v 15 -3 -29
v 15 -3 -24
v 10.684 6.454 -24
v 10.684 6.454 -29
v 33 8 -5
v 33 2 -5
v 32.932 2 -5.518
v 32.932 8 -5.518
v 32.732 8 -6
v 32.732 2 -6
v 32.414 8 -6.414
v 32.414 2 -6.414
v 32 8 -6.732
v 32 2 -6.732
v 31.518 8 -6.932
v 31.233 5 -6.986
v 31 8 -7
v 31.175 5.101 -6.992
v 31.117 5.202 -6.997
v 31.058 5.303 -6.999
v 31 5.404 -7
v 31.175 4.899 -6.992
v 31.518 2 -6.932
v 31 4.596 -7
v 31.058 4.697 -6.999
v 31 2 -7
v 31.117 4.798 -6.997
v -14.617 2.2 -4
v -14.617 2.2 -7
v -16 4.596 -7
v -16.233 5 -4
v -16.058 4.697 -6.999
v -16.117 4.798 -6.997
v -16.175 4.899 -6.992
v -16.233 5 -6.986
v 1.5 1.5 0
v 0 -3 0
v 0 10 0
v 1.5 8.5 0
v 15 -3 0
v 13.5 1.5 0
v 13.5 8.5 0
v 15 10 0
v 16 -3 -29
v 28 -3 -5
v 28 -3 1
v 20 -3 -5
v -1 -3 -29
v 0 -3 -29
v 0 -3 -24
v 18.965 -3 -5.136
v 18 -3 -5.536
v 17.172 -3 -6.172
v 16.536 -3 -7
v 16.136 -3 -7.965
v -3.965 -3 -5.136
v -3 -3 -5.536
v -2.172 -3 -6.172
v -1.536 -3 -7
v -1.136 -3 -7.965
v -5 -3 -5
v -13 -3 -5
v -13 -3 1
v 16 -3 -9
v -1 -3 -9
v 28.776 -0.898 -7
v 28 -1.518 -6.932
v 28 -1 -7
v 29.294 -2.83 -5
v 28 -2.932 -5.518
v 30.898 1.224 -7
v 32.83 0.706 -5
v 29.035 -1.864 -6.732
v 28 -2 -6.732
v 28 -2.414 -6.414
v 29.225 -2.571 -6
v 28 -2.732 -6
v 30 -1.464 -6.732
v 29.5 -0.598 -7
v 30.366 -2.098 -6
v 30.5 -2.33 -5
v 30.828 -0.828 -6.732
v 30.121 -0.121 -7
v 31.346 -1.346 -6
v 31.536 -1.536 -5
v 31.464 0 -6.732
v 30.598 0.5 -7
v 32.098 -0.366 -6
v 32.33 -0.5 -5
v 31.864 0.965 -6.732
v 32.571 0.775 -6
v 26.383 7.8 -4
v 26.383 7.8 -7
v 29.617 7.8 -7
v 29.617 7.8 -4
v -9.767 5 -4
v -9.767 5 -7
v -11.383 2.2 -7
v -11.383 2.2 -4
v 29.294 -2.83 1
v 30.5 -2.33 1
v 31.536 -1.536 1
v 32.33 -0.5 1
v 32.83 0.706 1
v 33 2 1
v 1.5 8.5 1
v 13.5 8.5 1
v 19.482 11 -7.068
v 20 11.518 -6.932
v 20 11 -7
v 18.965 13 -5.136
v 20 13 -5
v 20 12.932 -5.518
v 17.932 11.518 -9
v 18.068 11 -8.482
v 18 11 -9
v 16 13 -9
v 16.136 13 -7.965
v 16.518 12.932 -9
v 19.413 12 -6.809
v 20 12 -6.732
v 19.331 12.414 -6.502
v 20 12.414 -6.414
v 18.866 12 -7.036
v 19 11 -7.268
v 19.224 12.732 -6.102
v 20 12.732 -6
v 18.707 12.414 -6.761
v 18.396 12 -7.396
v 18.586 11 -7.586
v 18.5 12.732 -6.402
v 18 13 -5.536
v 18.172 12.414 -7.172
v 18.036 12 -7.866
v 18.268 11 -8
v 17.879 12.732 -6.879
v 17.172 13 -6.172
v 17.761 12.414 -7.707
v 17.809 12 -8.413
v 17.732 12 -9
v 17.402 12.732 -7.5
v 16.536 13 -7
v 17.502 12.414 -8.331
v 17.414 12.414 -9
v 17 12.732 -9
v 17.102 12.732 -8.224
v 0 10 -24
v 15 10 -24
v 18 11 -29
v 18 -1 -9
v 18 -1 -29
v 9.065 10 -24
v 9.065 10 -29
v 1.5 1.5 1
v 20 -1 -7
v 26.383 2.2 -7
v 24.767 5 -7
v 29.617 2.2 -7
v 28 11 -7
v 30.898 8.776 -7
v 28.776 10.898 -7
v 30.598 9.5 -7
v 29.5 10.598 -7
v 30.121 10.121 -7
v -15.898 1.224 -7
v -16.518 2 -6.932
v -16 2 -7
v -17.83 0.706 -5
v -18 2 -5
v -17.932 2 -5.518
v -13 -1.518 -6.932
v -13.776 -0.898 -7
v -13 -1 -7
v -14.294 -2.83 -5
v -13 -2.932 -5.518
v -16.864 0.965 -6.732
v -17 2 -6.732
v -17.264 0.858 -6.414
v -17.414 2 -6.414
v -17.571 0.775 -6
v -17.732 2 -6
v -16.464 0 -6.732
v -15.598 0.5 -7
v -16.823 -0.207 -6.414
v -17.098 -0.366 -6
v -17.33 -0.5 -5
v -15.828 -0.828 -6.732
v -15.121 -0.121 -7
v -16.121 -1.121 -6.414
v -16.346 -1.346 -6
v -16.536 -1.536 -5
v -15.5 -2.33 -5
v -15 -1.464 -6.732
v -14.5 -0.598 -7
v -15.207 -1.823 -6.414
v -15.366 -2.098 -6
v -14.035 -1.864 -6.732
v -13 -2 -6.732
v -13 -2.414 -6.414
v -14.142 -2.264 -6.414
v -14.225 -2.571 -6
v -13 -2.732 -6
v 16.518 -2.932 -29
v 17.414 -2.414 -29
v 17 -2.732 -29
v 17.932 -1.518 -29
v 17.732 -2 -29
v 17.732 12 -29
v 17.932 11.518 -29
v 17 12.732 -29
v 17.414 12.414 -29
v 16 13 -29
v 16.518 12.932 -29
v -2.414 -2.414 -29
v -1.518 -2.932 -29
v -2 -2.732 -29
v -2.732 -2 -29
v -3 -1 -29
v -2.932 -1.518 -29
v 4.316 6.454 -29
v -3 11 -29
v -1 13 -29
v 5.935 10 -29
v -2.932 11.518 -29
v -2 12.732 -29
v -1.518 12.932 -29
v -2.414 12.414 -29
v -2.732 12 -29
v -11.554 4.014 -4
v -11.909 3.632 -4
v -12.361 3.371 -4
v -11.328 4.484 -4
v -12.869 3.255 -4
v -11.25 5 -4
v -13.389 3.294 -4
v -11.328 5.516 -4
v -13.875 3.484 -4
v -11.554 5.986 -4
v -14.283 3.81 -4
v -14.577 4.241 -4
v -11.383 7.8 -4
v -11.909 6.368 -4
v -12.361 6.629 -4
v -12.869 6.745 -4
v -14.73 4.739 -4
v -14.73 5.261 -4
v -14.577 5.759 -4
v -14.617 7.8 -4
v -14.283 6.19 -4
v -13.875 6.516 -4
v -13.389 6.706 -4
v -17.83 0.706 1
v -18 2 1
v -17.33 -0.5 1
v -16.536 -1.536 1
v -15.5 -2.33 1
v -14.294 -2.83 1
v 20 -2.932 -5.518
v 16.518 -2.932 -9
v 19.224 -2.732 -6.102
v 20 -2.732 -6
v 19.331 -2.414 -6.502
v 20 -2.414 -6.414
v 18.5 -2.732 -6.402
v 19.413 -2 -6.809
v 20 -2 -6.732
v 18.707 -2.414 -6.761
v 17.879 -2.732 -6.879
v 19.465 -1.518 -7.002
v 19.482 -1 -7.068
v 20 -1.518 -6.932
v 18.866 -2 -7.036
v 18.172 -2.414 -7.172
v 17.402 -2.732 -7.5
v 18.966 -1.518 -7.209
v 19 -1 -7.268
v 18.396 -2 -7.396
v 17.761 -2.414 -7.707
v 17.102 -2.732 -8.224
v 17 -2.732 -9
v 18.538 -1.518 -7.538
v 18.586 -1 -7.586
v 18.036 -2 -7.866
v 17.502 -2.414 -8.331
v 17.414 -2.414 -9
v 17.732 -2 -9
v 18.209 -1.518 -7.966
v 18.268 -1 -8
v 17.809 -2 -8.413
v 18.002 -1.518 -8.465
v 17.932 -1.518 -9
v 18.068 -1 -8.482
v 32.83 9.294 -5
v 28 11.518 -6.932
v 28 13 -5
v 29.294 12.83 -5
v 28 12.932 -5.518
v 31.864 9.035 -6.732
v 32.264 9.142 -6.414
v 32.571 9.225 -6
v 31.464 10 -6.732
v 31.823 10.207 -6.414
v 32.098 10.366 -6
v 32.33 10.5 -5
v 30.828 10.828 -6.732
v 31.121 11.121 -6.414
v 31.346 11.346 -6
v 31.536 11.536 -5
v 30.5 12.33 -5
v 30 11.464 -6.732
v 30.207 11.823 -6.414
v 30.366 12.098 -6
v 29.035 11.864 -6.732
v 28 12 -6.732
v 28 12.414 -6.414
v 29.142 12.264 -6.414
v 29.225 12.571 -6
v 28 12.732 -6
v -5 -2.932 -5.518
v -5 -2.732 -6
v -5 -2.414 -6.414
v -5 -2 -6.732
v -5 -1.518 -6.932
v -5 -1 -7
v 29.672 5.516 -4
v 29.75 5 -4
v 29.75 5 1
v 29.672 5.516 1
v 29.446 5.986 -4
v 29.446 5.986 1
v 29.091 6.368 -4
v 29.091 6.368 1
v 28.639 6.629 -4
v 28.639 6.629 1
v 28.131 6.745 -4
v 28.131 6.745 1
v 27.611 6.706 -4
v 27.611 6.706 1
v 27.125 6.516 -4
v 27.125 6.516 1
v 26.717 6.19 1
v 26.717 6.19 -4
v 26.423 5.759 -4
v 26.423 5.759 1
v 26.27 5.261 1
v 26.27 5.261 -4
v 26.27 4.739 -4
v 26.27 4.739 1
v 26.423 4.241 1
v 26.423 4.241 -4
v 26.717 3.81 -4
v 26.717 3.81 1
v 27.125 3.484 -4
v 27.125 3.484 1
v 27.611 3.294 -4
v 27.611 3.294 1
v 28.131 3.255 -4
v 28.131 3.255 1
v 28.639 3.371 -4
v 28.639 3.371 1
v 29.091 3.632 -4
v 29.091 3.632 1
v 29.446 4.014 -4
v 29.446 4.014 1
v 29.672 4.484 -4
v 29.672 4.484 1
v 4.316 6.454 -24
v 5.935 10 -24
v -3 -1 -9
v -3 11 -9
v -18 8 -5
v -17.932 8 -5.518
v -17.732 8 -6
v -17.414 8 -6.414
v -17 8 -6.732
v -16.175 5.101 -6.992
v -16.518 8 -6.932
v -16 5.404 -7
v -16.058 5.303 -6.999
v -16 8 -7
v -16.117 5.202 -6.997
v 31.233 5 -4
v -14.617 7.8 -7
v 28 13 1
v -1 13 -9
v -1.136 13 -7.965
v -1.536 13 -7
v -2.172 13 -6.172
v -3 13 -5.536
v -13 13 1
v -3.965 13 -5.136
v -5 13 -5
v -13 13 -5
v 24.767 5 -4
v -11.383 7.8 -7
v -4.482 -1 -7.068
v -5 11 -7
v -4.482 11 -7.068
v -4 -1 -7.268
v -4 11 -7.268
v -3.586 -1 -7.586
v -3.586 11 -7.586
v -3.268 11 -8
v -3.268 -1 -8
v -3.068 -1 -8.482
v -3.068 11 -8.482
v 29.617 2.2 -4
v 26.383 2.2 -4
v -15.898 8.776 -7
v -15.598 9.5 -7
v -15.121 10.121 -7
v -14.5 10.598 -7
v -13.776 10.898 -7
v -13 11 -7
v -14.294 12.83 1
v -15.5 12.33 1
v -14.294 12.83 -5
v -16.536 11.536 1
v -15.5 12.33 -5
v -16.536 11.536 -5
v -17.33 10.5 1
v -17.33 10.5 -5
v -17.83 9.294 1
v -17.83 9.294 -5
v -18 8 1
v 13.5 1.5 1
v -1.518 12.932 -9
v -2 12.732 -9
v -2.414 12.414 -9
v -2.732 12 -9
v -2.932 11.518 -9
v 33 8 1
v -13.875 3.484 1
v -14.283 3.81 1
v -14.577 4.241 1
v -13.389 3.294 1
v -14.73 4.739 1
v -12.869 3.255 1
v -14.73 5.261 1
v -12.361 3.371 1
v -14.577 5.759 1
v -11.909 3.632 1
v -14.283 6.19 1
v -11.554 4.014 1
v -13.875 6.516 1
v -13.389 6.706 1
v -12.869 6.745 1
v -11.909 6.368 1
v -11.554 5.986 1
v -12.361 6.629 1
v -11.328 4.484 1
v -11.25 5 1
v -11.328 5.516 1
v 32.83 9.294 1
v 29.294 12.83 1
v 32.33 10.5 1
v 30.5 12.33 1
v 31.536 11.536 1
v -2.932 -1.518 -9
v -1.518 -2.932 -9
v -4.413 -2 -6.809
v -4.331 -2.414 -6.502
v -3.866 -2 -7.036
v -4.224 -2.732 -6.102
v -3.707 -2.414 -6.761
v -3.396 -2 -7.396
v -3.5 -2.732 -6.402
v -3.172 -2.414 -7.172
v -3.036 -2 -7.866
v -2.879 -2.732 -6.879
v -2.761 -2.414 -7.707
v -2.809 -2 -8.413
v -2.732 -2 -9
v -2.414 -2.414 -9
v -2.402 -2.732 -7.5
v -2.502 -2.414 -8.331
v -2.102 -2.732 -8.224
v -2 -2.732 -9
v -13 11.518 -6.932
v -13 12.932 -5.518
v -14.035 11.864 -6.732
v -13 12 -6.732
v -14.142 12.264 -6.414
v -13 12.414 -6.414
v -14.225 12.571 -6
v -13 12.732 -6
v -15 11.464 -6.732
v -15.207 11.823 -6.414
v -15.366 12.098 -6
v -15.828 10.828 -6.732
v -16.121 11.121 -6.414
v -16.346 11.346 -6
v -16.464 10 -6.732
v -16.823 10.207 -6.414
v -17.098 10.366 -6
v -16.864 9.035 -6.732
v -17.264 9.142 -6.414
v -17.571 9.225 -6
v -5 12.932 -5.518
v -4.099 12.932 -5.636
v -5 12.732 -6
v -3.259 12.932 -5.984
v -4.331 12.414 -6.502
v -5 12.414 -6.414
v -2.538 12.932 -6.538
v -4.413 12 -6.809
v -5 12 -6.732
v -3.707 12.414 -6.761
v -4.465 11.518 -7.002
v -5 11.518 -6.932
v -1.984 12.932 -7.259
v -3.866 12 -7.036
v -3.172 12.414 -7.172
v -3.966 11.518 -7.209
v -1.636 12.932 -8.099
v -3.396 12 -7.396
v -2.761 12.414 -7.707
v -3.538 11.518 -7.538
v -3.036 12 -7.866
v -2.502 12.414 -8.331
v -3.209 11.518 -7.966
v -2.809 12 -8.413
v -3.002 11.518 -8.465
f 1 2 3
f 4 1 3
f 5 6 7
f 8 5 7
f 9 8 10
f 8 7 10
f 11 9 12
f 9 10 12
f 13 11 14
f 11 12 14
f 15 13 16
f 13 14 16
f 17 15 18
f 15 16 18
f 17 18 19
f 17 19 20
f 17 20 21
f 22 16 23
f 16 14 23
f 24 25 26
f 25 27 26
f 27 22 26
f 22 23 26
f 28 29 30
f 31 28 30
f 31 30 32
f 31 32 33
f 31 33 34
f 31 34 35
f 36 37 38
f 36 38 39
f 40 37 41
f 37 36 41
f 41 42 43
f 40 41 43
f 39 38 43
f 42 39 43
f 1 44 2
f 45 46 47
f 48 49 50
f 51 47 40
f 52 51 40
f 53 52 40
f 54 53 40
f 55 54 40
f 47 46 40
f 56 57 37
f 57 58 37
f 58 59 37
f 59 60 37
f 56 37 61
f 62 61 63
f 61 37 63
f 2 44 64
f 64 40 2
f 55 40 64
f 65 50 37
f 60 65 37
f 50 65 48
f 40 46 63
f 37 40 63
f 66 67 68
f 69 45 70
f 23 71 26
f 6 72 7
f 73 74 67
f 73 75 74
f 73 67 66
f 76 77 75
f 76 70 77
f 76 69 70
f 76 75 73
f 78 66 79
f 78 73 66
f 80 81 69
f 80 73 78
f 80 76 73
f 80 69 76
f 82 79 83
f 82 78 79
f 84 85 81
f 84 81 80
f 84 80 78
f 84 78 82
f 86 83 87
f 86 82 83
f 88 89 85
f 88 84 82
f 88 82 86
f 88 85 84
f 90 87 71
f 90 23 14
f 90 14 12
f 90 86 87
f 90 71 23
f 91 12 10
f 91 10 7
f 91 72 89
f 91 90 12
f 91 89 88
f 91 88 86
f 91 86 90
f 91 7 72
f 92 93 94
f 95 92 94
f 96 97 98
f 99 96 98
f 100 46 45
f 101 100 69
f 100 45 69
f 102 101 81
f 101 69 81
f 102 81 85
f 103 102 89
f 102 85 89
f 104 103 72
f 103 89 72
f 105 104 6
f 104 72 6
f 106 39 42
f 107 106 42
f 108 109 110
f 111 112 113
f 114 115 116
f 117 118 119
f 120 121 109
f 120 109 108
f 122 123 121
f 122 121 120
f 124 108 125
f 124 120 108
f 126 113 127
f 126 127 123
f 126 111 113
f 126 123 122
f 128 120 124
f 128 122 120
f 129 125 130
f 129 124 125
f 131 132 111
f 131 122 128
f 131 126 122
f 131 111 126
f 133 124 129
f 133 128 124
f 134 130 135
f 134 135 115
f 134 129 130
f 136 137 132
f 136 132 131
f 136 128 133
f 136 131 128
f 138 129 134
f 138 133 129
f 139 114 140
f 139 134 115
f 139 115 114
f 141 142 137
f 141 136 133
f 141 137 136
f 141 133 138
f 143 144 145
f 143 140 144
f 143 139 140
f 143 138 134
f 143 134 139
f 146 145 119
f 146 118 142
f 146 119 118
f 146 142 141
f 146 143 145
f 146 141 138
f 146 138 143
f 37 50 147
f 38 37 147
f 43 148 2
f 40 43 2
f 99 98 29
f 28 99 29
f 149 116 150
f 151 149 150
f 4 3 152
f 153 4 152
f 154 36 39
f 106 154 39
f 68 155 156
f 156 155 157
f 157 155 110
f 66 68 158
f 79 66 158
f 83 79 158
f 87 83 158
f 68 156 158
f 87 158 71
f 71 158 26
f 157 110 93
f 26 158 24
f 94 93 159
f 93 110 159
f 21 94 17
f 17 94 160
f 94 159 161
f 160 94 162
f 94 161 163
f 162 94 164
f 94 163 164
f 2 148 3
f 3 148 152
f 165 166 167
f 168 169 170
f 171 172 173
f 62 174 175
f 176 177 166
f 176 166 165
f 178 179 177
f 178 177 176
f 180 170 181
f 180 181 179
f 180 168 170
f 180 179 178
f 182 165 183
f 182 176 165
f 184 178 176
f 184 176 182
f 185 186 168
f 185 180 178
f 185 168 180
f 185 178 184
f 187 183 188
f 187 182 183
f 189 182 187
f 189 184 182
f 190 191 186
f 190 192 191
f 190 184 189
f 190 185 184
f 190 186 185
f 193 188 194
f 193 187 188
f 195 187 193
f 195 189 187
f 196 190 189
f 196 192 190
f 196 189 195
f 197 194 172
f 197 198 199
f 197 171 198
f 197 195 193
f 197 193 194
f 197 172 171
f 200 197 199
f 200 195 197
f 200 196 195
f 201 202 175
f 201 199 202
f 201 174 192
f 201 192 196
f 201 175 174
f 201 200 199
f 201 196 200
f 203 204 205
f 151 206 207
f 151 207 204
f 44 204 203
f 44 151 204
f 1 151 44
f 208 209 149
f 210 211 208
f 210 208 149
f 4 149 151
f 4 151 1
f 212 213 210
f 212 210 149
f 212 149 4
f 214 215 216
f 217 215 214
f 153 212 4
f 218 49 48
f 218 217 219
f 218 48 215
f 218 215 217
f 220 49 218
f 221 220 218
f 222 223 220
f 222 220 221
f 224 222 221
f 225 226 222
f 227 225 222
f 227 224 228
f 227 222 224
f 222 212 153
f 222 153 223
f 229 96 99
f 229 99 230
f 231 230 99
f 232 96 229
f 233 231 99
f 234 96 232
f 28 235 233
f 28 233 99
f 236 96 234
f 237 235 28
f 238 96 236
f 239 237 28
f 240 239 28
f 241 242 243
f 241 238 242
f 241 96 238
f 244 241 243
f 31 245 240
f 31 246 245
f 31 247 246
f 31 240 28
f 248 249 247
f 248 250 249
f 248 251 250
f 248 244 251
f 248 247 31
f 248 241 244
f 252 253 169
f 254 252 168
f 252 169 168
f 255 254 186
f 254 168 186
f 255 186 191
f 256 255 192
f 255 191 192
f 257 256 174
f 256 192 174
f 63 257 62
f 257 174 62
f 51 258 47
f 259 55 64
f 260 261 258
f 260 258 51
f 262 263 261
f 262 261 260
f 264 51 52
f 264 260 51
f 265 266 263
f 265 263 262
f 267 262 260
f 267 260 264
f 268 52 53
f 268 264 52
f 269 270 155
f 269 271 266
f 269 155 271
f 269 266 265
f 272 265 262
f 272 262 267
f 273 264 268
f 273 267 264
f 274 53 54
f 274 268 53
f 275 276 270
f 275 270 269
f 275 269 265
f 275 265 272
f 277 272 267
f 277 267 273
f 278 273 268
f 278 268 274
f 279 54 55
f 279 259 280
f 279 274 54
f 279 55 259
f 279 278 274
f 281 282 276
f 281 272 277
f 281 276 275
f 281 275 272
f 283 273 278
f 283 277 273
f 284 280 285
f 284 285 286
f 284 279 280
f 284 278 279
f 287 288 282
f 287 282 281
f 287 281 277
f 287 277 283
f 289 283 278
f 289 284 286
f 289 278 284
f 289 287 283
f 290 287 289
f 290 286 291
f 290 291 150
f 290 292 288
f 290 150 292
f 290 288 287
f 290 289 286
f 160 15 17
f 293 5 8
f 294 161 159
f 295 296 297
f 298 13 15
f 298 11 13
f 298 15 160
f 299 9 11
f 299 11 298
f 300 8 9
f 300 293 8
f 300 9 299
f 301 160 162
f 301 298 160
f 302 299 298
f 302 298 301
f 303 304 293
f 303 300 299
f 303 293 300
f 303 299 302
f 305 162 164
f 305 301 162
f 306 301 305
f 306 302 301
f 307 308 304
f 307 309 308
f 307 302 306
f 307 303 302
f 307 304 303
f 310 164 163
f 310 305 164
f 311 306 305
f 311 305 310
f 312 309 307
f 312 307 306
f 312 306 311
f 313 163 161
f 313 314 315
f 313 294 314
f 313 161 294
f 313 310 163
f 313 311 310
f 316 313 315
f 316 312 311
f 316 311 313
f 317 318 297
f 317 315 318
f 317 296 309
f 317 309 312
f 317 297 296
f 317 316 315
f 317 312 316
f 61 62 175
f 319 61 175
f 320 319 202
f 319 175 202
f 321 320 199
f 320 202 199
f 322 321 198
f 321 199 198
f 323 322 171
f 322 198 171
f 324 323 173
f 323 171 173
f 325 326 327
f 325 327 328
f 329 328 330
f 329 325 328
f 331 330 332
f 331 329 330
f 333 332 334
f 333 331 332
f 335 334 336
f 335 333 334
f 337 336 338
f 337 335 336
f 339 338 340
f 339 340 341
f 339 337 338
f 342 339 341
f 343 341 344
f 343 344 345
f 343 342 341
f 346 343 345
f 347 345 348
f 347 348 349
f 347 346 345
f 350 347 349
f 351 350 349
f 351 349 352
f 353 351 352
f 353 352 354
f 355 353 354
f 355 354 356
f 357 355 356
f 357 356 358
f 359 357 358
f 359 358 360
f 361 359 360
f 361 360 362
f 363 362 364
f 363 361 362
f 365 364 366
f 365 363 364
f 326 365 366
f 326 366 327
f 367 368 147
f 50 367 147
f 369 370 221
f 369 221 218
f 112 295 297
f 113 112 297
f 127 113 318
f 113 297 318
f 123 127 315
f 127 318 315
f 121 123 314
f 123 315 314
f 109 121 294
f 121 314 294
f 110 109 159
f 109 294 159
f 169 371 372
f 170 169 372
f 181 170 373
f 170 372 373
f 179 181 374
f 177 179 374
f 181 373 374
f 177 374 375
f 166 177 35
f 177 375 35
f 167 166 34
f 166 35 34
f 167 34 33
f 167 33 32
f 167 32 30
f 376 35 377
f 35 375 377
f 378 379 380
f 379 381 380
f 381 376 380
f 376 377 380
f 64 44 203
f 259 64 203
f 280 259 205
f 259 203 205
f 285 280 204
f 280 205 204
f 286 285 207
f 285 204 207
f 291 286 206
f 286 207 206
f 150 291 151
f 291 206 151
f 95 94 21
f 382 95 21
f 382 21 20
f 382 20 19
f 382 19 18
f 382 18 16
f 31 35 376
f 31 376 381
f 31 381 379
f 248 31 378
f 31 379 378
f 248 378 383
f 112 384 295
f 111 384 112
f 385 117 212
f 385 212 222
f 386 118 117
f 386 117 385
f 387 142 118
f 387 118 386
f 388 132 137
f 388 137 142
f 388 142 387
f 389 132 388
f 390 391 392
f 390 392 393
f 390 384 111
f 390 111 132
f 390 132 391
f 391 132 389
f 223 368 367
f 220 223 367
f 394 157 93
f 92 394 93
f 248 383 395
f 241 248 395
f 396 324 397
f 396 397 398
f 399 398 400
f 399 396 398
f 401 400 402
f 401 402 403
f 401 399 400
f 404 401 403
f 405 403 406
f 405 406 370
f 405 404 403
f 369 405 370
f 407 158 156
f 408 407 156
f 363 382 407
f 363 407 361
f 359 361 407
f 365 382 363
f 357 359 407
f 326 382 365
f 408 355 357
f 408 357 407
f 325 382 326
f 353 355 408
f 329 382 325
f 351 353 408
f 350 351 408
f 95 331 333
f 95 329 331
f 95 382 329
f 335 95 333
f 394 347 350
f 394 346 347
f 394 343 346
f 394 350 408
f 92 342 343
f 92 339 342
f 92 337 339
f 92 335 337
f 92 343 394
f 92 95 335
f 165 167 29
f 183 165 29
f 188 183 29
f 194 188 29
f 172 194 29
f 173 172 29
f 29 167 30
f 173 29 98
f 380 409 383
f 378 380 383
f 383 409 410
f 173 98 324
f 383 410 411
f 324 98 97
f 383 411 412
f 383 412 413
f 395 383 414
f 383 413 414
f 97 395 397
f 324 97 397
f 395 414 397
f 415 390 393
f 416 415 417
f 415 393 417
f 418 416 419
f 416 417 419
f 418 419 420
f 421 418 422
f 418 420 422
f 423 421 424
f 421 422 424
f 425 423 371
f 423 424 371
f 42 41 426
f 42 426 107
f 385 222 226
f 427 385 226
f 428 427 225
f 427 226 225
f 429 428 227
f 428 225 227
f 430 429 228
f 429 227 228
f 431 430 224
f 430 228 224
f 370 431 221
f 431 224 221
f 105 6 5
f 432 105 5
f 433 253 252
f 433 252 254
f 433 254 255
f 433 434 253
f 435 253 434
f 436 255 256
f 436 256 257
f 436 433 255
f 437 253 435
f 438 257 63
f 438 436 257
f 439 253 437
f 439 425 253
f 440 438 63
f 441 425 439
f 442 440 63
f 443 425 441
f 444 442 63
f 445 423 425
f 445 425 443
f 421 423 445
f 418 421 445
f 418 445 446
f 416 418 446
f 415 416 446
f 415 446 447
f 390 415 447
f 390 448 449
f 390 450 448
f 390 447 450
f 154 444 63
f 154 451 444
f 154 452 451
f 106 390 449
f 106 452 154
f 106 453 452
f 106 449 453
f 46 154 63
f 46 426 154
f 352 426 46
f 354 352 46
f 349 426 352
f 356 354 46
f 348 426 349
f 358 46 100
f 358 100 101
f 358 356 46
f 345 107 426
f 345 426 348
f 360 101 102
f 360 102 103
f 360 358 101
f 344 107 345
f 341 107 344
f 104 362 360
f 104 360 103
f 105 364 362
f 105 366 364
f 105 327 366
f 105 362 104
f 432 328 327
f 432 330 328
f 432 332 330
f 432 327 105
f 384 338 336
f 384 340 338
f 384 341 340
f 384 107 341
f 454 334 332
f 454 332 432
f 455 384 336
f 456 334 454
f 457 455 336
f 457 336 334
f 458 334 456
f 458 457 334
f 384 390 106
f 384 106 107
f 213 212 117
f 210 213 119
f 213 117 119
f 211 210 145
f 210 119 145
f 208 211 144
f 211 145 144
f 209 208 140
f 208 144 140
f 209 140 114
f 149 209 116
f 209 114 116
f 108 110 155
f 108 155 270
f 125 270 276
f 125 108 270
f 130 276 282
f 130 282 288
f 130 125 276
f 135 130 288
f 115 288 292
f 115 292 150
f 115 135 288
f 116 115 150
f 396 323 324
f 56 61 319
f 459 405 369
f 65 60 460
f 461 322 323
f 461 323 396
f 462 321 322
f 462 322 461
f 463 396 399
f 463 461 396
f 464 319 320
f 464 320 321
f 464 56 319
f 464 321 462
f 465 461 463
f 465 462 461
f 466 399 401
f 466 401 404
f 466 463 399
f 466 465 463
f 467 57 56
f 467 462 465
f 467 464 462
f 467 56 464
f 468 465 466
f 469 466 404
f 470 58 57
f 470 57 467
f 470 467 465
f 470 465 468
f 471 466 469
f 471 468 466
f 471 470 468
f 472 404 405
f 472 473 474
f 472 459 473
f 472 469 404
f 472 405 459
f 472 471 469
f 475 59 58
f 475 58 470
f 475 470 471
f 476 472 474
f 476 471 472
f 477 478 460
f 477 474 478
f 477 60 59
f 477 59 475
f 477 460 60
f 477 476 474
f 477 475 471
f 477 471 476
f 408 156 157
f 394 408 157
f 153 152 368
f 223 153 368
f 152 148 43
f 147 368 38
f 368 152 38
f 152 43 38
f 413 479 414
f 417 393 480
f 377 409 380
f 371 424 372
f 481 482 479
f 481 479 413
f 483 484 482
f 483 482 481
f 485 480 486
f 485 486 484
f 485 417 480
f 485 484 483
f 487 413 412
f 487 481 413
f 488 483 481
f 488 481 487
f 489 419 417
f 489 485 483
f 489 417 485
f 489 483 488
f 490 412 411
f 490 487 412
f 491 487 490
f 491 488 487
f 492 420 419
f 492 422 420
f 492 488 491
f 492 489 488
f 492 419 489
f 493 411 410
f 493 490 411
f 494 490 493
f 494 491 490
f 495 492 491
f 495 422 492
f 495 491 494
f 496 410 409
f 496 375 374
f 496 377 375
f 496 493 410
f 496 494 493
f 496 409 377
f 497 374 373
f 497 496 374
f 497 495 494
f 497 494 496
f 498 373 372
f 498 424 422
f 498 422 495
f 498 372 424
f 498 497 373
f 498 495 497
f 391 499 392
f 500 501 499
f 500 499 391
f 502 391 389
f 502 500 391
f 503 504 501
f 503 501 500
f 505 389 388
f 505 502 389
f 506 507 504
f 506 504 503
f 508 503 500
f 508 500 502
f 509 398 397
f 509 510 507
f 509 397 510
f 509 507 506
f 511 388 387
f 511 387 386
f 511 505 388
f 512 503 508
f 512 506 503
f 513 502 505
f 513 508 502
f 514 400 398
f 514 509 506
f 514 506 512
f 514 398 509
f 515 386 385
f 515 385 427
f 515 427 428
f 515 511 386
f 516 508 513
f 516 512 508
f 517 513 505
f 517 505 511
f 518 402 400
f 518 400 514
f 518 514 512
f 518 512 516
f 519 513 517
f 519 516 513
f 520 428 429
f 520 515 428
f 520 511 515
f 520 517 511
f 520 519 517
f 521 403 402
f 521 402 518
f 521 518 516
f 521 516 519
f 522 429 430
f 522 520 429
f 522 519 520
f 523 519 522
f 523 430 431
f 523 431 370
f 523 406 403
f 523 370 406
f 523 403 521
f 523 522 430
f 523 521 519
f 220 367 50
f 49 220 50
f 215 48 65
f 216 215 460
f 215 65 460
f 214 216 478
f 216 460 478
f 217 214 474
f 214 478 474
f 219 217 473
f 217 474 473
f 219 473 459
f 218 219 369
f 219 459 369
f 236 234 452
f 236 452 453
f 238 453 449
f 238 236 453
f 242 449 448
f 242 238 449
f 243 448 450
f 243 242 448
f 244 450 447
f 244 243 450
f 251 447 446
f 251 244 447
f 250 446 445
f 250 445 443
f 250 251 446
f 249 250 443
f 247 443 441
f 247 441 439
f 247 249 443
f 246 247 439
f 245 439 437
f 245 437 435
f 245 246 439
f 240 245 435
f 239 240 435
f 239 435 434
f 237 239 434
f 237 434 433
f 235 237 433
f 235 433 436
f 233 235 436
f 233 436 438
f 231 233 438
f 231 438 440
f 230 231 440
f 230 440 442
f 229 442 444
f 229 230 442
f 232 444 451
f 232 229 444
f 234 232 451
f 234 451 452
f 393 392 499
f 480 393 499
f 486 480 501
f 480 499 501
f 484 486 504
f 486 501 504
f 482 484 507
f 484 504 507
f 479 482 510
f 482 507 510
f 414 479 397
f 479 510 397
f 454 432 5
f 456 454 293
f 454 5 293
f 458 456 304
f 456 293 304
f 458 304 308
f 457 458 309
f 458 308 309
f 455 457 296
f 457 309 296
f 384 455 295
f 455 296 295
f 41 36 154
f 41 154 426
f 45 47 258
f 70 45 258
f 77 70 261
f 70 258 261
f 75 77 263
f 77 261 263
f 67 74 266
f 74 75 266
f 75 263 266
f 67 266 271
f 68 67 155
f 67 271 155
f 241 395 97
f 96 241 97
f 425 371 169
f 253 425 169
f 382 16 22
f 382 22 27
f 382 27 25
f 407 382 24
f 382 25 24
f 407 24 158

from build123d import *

# Parameters (mm, degrees)
SKETCH1_W           = 15
SKETCH1_H           = 10
SKETCH1_W_2         = 12
SKETCH1_H_2         = 7
SKETCH1_H_3         = 3
SKETCH1_R           = 1.75
BOSS_EXTRUDE1_DEPTH = 1
BOSS_EXTRUDE2_DEPTH = 24
BOSS_EXTRUDE3_START = -7
SKETCH1_5_R         = 1.75
BOSS_EXTRUDE3_DEPTH = 7
BOSS_EXTRUDE4_DEPTH = 5
CUT_EXTRUDE1_DEPTH  = 20
FILLET1_R           = 2


with BuildPart() as part:
    # Sketch1 → Boss-Extrude1 (new body)
    # profile 1 of 7: a face of its own
    with BuildSketch(Plane.XY):
        with Locations((7.5, 5)):
            Rectangle(SKETCH1_W, SKETCH1_H)
        with Locations((7.5, 5)):
            Rectangle(SKETCH1_W_2, SKETCH1_H_2, mode=Mode.SUBTRACT)
    # profile 2 of 7: a face of its own
    with BuildSketch(Plane.XY):
        with Locations((7.5, -1.5)):
            Rectangle(SKETCH1_W, SKETCH1_H_3)
    # profile 3 of 7: a face of its own
    with BuildSketch(Plane.XY):
        Polygon((0, -3), (0, 0), (0, 10), (15, 10), (15, 0), (15, -3), (18, -3), (18, 13), (-3, 13), (-3, -3), align=None)
    # profile 4 of 7: a face of its own
    with BuildSketch(Plane.XY):
        with BuildLine():
            Line((-13, -3), (-3, -3))
            Line((-3, -3), (-3, 13))
            Line((-3, 13), (-13, 13))
            ThreePointArc((-13, 13), (-16.535533906, 11.535533906), (-18, 8))
            Line((-18, 8), (-18, 2))
            ThreePointArc((-18, 2), (-16.535533906, -1.535533906), (-13, -3))
        make_face()
        Polygon((-11.383419246, 7.8), (-9.766838493, 5), (-11.383419246, 2.2), (-14.616580754, 2.2), (-16.233161507, 5), (-14.616580754, 7.8), align=None, mode=Mode.SUBTRACT)
    # profile 5 of 7: a face of its own
    with BuildSketch(Plane.XY):
        Polygon((-14.616580754, 2.2), (-11.383419246, 2.2), (-9.766838493, 5), (-11.383419246, 7.8), (-14.616580754, 7.8), (-16.233161507, 5), align=None)
        with Locations((-13, 5)):
            Circle(SKETCH1_R, mode=Mode.SUBTRACT)
    # profile 6 of 7: a face of its own
    with BuildSketch(Plane.XY):
        with BuildLine():
            Line((18, 13), (18, -3))
            Line((18, -3), (28, -3))
            ThreePointArc((28, -3), (31.535533906, -1.535533906), (33, 2))
            Line((33, 2), (33, 8))
            ThreePointArc((33, 8), (31.535533906, 11.535533906), (28, 13))
            Line((28, 13), (18, 13))
        make_face()
        Polygon((26.383419246, 2.2), (24.766838493, 5), (26.383419246, 7.8), (29.616580754, 7.8), (31.233161507, 5), (29.616580754, 2.2), align=None, mode=Mode.SUBTRACT)
    # profile 7 of 7: a face of its own
    with BuildSketch(Plane.XY):
        Polygon((29.616580754, 7.8), (26.383419246, 7.8), (24.766838493, 5), (26.383419246, 2.2), (29.616580754, 2.2), (31.233161507, 5), align=None)
        with Locations((28, 5)):
            Circle(SKETCH1_R, mode=Mode.SUBTRACT)
    extrude(amount=BOSS_EXTRUDE1_DEPTH)

    # Sketch1<4> → Boss-Extrude2 (add)
    with BuildSketch(Plane.XY):
        Polygon((0, -3), (0, 0), (0, 10), (15, 10), (15, 0), (15, -3), (18, -3), (18, 13), (-3, 13), (-3, -3), align=None)
    extrude(amount=-BOSS_EXTRUDE2_DEPTH)

    # Sketch1<5> → Boss-Extrude3 (add)
    # profile 1 of 4: a face of its own
    with BuildSketch(Plane.XY.offset(BOSS_EXTRUDE3_START)):
        with BuildLine():
            Line((18, 13), (18, -3))
            Line((18, -3), (28, -3))
            ThreePointArc((28, -3), (31.535533906, -1.535533906), (33, 2))
            Line((33, 2), (33, 8))
            ThreePointArc((33, 8), (31.535533906, 11.535533906), (28, 13))
            Line((28, 13), (18, 13))
        make_face()
        Polygon((26.383419246, 2.2), (24.766838493, 5), (26.383419246, 7.8), (29.616580754, 7.8), (31.233161507, 5), (29.616580754, 2.2), align=None, mode=Mode.SUBTRACT)
    # profile 2 of 4: a face of its own
    with BuildSketch(Plane.XY.offset(BOSS_EXTRUDE3_START)):
        Polygon((29.616580754, 7.8), (26.383419246, 7.8), (24.766838493, 5), (26.383419246, 2.2), (29.616580754, 2.2), (31.233161507, 5), align=None)
        with Locations((28, 5)):
            Circle(SKETCH1_5_R, mode=Mode.SUBTRACT)
    # profile 3 of 4: a face of its own
    with BuildSketch(Plane.XY.offset(BOSS_EXTRUDE3_START)):
        with BuildLine():
            Line((-13, -3), (-3, -3))
            Line((-3, -3), (-3, 13))
            Line((-3, 13), (-13, 13))
            ThreePointArc((-13, 13), (-16.535533906, 11.535533906), (-18, 8))
            Line((-18, 8), (-18, 2))
            ThreePointArc((-18, 2), (-16.535533906, -1.535533906), (-13, -3))
        make_face()
        Polygon((-11.383419246, 7.8), (-9.766838493, 5), (-11.383419246, 2.2), (-14.616580754, 2.2), (-16.233161507, 5), (-14.616580754, 7.8), align=None, mode=Mode.SUBTRACT)
    # profile 4 of 4: a face of its own
    with BuildSketch(Plane.XY.offset(BOSS_EXTRUDE3_START)):
        Polygon((-14.616580754, 2.2), (-11.383419246, 2.2), (-9.766838493, 5), (-11.383419246, 7.8), (-14.616580754, 7.8), (-16.233161507, 5), align=None)
        with Locations((-13, 5)):
            Circle(SKETCH1_5_R, mode=Mode.SUBTRACT)
    extrude(amount=BOSS_EXTRUDE3_DEPTH)

    # Sketch2 → Boss-Extrude4 (add)
    with BuildSketch(Plane(origin=(0, 0, -24), x_dir=(-1, 0, 0), z_dir=(0, 0, -1))):
        Polygon((-18, -3), (-15, -3), (-15, 10), (0, 10), (0, -3), (3, -3), (3, 13), (-18, 13), align=None)
        Polygon((-4.316136934, 6.453621675), (0, -3), (0, 10), (-5.935268204, 10), align=None)
        Polygon((-15, 10), (-15, -3), (-10.683863071, 6.453621665), (-9.064731796, 10), align=None)
    extrude(amount=BOSS_EXTRUDE4_DEPTH)

    # Sketch2<4> → Cut-Extrude1 (cut)
    with BuildSketch(Plane(origin=(0, 0, -24), x_dir=(-1, 0, 0), z_dir=(0, 0, -1))):
        Polygon((14.616580754, 7.8), (11.383419246, 7.8), (9.766838493, 5), (11.383419246, 2.2), (14.616580754, 2.2), (16.233161507, 5), align=None)
        Polygon((-29.616580754, 2.2), (-26.383419246, 2.2), (-24.766838493, 5), (-26.383419246, 7.8), (-29.616580754, 7.8), (-31.233161507, 5), align=None)
    extrude(amount=-CUT_EXTRUDE1_DEPTH, mode=Mode.SUBTRACT)

    # Fillet1
    # the kernel refuses this fillet: 2 mm, written as the material it adds along each edge
    with BuildSketch(Plane(origin=(18, 13, -7), x_dir=(1, 0, 0), z_dir=(0, -1, 0)), Plane(origin=(-3, -3, -7), x_dir=(-1, 0, 0), z_dir=(0, 1, 0))) as fillet1_piece_1:
        with BuildLine():
            CenterArc((FILLET1_R, -FILLET1_R), FILLET1_R, 90, 90)
            Line((0, -FILLET1_R), (0, 0))
            Line((0, 0), (FILLET1_R, 0))
        make_face()
    extrude(amount=16)
    # the kernel refuses this fillet: 2 mm, written as the material it takes off along each edge
    with BuildSketch(Plane(origin=(-3, -3, -9), x_dir=(1, 0, 0), z_dir=(0, 0, -1)), Plane(origin=(-3, 13, -34), x_dir=(1, 0, 0), z_dir=(0, 0, 1)), Plane(origin=(18, 13, -9), x_dir=(-1, 0, 0), z_dir=(0, 0, -1)), Plane(origin=(18, -3, -34), x_dir=(-1, 0, 0), z_dir=(0, 0, 1))) as fillet1_2_piece_1:
        with BuildLine():
            CenterArc((FILLET1_R, -FILLET1_R), FILLET1_R, 90, 90)
            Line((0, -FILLET1_R), (0, 0))
            Line((0, 0), (FILLET1_R, 0))
        make_face()
    extrude(amount=25, mode=Mode.SUBTRACT)
    with BuildSketch(Plane(origin=(28, 2, -7), x_dir=(0, -1, 0), z_dir=(-1, 0, 0))) as fillet1_2_piece_2:
        with BuildLine():
            CenterArc((5 - FILLET1_R, FILLET1_R), FILLET1_R, 270, 90)
            Line((5 - FILLET1_R, 0), (5, 0))
            Line((5, 0), (5, FILLET1_R))
        make_face()
    revolve(axis=Axis((28, 2, -7), (0, 0, 1)), revolution_arc=90, mode=Mode.SUBTRACT)
    with BuildSketch(Plane(origin=(20, -3, -7), x_dir=(0, 0, 1), z_dir=(1, 0, 0)), Plane(origin=(28, 13, -7), x_dir=(0, 0, 1), z_dir=(-1, 0, 0)), Plane(origin=(-13, -3, -7), x_dir=(0, 0, 1), z_dir=(1, 0, 0)), Plane(origin=(-5, 13, -7), x_dir=(0, 0, 1), z_dir=(-1, 0, 0))) as fillet1_2_piece_3:
        with BuildLine():
            CenterArc((FILLET1_R, -FILLET1_R), FILLET1_R, 90, 90)
            Line((0, -FILLET1_R), (0, 0))
            Line((0, 0), (FILLET1_R, 0))
        make_face()
    extrude(amount=8, mode=Mode.SUBTRACT)
    with BuildSketch(Plane(origin=(28, 8, -7), x_dir=(1, 0, 0), z_dir=(0, -1, 0))) as fillet1_2_piece_4:
        with BuildLine():
            CenterArc((5 - FILLET1_R, FILLET1_R), FILLET1_R, 270, 90)
            Line((5 - FILLET1_R, 0), (5, 0))
            Line((5, 0), (5, FILLET1_R))
        make_face()
    revolve(axis=Axis((28, 8, -7), (0, 0, 1)), revolution_arc=90, mode=Mode.SUBTRACT)
    with BuildSketch(Plane(origin=(33, 2, -7), x_dir=(0, 0, 1), z_dir=(0, 1, 0)), Plane(origin=(-18, 8, -7), x_dir=(0, 0, 1), z_dir=(0, -1, 0))) as fillet1_2_piece_5:
        with BuildLine():
            CenterArc((FILLET1_R, -FILLET1_R), FILLET1_R, 90, 90)
            Line((0, -FILLET1_R), (0, 0))
            Line((0, 0), (FILLET1_R, 0))
        make_face()
    extrude(amount=6, mode=Mode.SUBTRACT)
    with BuildSketch(Plane(origin=(-13, 2, -7), x_dir=(-1, 0, 0), z_dir=(0, 1, 0))) as fillet1_2_piece_6:
        with BuildLine():
            CenterArc((5 - FILLET1_R, FILLET1_R), FILLET1_R, 270, 90)
            Line((5 - FILLET1_R, 0), (5, 0))
            Line((5, 0), (5, FILLET1_R))
        make_face()
    revolve(axis=Axis((-13, 2, -7), (0, 0, 1)), revolution_arc=90, mode=Mode.SUBTRACT)
    with BuildSketch(Plane(origin=(-13, 8, -7), x_dir=(0, 1, 0), z_dir=(1, 0, 0))) as fillet1_2_piece_7:
        with BuildLine():
            CenterArc((5 - FILLET1_R, FILLET1_R), FILLET1_R, 270, 90)
            Line((5 - FILLET1_R, 0), (5, 0))
            Line((5, 0), (5, FILLET1_R))
        make_face()
    revolve(axis=Axis((-13, 8, -7), (0, 0, 1)), revolution_arc=90, mode=Mode.SUBTRACT)
    with BuildSketch(Plane(origin=(-5, 13, -9), x_dir=(0, 0, 1), z_dir=(-1, 0, 0))) as fillet1_2_piece_8:
        with BuildLine():
            CenterArc((2 + FILLET1_R, -FILLET1_R), FILLET1_R, 90, 90)
            Line((2, -FILLET1_R), (2, 0))
            Line((2, 0), (2 + FILLET1_R, 0))
        make_face()
    revolve(axis=Axis((-5, 13, -9), (0, 1, 0)), revolution_arc=90, mode=Mode.SUBTRACT)
    with BuildSketch(Plane(origin=(-5, -3, -9), x_dir=(0, 0, 1), z_dir=(-1, 0, 0))) as fillet1_2_piece_9:
        with BuildLine():
            CenterArc((2 + FILLET1_R, FILLET1_R), FILLET1_R, 180, 90)
            Line((2, FILLET1_R), (2, 0))
            Line((2, 0), (2 + FILLET1_R, 0))
        make_face()
    revolve(axis=Axis((-5, -3, -9), (0, 1, 0)), revolution_arc=90, mode=Mode.SUBTRACT)
    with BuildSketch(Plane(origin=(20, 13, -9), x_dir=(0, 0, 1), z_dir=(1, 0, 0))) as fillet1_2_piece_10:
        with BuildLine():
            CenterArc((2 + FILLET1_R, FILLET1_R), FILLET1_R, 180, 90)
            Line((2, FILLET1_R), (2, 0))
            Line((2, 0), (2 + FILLET1_R, 0))
        make_face()
    revolve(axis=Axis((20, 13, -9), (0, -1, 0)), revolution_arc=90, mode=Mode.SUBTRACT)
    with BuildSketch(Plane(origin=(20, -3, -9), x_dir=(0, 0, 1), z_dir=(1, 0, 0))) as fillet1_2_piece_11:
        with BuildLine():
            CenterArc((2 + FILLET1_R, -FILLET1_R), FILLET1_R, 90, 90)
            Line((2, -FILLET1_R), (2, 0))
            Line((2, 0), (2 + FILLET1_R, 0))
        make_face()
    revolve(axis=Axis((20, -3, -9), (0, -1, 0)), revolution_arc=90, mode=Mode.SUBTRACT)


solid = part.part
